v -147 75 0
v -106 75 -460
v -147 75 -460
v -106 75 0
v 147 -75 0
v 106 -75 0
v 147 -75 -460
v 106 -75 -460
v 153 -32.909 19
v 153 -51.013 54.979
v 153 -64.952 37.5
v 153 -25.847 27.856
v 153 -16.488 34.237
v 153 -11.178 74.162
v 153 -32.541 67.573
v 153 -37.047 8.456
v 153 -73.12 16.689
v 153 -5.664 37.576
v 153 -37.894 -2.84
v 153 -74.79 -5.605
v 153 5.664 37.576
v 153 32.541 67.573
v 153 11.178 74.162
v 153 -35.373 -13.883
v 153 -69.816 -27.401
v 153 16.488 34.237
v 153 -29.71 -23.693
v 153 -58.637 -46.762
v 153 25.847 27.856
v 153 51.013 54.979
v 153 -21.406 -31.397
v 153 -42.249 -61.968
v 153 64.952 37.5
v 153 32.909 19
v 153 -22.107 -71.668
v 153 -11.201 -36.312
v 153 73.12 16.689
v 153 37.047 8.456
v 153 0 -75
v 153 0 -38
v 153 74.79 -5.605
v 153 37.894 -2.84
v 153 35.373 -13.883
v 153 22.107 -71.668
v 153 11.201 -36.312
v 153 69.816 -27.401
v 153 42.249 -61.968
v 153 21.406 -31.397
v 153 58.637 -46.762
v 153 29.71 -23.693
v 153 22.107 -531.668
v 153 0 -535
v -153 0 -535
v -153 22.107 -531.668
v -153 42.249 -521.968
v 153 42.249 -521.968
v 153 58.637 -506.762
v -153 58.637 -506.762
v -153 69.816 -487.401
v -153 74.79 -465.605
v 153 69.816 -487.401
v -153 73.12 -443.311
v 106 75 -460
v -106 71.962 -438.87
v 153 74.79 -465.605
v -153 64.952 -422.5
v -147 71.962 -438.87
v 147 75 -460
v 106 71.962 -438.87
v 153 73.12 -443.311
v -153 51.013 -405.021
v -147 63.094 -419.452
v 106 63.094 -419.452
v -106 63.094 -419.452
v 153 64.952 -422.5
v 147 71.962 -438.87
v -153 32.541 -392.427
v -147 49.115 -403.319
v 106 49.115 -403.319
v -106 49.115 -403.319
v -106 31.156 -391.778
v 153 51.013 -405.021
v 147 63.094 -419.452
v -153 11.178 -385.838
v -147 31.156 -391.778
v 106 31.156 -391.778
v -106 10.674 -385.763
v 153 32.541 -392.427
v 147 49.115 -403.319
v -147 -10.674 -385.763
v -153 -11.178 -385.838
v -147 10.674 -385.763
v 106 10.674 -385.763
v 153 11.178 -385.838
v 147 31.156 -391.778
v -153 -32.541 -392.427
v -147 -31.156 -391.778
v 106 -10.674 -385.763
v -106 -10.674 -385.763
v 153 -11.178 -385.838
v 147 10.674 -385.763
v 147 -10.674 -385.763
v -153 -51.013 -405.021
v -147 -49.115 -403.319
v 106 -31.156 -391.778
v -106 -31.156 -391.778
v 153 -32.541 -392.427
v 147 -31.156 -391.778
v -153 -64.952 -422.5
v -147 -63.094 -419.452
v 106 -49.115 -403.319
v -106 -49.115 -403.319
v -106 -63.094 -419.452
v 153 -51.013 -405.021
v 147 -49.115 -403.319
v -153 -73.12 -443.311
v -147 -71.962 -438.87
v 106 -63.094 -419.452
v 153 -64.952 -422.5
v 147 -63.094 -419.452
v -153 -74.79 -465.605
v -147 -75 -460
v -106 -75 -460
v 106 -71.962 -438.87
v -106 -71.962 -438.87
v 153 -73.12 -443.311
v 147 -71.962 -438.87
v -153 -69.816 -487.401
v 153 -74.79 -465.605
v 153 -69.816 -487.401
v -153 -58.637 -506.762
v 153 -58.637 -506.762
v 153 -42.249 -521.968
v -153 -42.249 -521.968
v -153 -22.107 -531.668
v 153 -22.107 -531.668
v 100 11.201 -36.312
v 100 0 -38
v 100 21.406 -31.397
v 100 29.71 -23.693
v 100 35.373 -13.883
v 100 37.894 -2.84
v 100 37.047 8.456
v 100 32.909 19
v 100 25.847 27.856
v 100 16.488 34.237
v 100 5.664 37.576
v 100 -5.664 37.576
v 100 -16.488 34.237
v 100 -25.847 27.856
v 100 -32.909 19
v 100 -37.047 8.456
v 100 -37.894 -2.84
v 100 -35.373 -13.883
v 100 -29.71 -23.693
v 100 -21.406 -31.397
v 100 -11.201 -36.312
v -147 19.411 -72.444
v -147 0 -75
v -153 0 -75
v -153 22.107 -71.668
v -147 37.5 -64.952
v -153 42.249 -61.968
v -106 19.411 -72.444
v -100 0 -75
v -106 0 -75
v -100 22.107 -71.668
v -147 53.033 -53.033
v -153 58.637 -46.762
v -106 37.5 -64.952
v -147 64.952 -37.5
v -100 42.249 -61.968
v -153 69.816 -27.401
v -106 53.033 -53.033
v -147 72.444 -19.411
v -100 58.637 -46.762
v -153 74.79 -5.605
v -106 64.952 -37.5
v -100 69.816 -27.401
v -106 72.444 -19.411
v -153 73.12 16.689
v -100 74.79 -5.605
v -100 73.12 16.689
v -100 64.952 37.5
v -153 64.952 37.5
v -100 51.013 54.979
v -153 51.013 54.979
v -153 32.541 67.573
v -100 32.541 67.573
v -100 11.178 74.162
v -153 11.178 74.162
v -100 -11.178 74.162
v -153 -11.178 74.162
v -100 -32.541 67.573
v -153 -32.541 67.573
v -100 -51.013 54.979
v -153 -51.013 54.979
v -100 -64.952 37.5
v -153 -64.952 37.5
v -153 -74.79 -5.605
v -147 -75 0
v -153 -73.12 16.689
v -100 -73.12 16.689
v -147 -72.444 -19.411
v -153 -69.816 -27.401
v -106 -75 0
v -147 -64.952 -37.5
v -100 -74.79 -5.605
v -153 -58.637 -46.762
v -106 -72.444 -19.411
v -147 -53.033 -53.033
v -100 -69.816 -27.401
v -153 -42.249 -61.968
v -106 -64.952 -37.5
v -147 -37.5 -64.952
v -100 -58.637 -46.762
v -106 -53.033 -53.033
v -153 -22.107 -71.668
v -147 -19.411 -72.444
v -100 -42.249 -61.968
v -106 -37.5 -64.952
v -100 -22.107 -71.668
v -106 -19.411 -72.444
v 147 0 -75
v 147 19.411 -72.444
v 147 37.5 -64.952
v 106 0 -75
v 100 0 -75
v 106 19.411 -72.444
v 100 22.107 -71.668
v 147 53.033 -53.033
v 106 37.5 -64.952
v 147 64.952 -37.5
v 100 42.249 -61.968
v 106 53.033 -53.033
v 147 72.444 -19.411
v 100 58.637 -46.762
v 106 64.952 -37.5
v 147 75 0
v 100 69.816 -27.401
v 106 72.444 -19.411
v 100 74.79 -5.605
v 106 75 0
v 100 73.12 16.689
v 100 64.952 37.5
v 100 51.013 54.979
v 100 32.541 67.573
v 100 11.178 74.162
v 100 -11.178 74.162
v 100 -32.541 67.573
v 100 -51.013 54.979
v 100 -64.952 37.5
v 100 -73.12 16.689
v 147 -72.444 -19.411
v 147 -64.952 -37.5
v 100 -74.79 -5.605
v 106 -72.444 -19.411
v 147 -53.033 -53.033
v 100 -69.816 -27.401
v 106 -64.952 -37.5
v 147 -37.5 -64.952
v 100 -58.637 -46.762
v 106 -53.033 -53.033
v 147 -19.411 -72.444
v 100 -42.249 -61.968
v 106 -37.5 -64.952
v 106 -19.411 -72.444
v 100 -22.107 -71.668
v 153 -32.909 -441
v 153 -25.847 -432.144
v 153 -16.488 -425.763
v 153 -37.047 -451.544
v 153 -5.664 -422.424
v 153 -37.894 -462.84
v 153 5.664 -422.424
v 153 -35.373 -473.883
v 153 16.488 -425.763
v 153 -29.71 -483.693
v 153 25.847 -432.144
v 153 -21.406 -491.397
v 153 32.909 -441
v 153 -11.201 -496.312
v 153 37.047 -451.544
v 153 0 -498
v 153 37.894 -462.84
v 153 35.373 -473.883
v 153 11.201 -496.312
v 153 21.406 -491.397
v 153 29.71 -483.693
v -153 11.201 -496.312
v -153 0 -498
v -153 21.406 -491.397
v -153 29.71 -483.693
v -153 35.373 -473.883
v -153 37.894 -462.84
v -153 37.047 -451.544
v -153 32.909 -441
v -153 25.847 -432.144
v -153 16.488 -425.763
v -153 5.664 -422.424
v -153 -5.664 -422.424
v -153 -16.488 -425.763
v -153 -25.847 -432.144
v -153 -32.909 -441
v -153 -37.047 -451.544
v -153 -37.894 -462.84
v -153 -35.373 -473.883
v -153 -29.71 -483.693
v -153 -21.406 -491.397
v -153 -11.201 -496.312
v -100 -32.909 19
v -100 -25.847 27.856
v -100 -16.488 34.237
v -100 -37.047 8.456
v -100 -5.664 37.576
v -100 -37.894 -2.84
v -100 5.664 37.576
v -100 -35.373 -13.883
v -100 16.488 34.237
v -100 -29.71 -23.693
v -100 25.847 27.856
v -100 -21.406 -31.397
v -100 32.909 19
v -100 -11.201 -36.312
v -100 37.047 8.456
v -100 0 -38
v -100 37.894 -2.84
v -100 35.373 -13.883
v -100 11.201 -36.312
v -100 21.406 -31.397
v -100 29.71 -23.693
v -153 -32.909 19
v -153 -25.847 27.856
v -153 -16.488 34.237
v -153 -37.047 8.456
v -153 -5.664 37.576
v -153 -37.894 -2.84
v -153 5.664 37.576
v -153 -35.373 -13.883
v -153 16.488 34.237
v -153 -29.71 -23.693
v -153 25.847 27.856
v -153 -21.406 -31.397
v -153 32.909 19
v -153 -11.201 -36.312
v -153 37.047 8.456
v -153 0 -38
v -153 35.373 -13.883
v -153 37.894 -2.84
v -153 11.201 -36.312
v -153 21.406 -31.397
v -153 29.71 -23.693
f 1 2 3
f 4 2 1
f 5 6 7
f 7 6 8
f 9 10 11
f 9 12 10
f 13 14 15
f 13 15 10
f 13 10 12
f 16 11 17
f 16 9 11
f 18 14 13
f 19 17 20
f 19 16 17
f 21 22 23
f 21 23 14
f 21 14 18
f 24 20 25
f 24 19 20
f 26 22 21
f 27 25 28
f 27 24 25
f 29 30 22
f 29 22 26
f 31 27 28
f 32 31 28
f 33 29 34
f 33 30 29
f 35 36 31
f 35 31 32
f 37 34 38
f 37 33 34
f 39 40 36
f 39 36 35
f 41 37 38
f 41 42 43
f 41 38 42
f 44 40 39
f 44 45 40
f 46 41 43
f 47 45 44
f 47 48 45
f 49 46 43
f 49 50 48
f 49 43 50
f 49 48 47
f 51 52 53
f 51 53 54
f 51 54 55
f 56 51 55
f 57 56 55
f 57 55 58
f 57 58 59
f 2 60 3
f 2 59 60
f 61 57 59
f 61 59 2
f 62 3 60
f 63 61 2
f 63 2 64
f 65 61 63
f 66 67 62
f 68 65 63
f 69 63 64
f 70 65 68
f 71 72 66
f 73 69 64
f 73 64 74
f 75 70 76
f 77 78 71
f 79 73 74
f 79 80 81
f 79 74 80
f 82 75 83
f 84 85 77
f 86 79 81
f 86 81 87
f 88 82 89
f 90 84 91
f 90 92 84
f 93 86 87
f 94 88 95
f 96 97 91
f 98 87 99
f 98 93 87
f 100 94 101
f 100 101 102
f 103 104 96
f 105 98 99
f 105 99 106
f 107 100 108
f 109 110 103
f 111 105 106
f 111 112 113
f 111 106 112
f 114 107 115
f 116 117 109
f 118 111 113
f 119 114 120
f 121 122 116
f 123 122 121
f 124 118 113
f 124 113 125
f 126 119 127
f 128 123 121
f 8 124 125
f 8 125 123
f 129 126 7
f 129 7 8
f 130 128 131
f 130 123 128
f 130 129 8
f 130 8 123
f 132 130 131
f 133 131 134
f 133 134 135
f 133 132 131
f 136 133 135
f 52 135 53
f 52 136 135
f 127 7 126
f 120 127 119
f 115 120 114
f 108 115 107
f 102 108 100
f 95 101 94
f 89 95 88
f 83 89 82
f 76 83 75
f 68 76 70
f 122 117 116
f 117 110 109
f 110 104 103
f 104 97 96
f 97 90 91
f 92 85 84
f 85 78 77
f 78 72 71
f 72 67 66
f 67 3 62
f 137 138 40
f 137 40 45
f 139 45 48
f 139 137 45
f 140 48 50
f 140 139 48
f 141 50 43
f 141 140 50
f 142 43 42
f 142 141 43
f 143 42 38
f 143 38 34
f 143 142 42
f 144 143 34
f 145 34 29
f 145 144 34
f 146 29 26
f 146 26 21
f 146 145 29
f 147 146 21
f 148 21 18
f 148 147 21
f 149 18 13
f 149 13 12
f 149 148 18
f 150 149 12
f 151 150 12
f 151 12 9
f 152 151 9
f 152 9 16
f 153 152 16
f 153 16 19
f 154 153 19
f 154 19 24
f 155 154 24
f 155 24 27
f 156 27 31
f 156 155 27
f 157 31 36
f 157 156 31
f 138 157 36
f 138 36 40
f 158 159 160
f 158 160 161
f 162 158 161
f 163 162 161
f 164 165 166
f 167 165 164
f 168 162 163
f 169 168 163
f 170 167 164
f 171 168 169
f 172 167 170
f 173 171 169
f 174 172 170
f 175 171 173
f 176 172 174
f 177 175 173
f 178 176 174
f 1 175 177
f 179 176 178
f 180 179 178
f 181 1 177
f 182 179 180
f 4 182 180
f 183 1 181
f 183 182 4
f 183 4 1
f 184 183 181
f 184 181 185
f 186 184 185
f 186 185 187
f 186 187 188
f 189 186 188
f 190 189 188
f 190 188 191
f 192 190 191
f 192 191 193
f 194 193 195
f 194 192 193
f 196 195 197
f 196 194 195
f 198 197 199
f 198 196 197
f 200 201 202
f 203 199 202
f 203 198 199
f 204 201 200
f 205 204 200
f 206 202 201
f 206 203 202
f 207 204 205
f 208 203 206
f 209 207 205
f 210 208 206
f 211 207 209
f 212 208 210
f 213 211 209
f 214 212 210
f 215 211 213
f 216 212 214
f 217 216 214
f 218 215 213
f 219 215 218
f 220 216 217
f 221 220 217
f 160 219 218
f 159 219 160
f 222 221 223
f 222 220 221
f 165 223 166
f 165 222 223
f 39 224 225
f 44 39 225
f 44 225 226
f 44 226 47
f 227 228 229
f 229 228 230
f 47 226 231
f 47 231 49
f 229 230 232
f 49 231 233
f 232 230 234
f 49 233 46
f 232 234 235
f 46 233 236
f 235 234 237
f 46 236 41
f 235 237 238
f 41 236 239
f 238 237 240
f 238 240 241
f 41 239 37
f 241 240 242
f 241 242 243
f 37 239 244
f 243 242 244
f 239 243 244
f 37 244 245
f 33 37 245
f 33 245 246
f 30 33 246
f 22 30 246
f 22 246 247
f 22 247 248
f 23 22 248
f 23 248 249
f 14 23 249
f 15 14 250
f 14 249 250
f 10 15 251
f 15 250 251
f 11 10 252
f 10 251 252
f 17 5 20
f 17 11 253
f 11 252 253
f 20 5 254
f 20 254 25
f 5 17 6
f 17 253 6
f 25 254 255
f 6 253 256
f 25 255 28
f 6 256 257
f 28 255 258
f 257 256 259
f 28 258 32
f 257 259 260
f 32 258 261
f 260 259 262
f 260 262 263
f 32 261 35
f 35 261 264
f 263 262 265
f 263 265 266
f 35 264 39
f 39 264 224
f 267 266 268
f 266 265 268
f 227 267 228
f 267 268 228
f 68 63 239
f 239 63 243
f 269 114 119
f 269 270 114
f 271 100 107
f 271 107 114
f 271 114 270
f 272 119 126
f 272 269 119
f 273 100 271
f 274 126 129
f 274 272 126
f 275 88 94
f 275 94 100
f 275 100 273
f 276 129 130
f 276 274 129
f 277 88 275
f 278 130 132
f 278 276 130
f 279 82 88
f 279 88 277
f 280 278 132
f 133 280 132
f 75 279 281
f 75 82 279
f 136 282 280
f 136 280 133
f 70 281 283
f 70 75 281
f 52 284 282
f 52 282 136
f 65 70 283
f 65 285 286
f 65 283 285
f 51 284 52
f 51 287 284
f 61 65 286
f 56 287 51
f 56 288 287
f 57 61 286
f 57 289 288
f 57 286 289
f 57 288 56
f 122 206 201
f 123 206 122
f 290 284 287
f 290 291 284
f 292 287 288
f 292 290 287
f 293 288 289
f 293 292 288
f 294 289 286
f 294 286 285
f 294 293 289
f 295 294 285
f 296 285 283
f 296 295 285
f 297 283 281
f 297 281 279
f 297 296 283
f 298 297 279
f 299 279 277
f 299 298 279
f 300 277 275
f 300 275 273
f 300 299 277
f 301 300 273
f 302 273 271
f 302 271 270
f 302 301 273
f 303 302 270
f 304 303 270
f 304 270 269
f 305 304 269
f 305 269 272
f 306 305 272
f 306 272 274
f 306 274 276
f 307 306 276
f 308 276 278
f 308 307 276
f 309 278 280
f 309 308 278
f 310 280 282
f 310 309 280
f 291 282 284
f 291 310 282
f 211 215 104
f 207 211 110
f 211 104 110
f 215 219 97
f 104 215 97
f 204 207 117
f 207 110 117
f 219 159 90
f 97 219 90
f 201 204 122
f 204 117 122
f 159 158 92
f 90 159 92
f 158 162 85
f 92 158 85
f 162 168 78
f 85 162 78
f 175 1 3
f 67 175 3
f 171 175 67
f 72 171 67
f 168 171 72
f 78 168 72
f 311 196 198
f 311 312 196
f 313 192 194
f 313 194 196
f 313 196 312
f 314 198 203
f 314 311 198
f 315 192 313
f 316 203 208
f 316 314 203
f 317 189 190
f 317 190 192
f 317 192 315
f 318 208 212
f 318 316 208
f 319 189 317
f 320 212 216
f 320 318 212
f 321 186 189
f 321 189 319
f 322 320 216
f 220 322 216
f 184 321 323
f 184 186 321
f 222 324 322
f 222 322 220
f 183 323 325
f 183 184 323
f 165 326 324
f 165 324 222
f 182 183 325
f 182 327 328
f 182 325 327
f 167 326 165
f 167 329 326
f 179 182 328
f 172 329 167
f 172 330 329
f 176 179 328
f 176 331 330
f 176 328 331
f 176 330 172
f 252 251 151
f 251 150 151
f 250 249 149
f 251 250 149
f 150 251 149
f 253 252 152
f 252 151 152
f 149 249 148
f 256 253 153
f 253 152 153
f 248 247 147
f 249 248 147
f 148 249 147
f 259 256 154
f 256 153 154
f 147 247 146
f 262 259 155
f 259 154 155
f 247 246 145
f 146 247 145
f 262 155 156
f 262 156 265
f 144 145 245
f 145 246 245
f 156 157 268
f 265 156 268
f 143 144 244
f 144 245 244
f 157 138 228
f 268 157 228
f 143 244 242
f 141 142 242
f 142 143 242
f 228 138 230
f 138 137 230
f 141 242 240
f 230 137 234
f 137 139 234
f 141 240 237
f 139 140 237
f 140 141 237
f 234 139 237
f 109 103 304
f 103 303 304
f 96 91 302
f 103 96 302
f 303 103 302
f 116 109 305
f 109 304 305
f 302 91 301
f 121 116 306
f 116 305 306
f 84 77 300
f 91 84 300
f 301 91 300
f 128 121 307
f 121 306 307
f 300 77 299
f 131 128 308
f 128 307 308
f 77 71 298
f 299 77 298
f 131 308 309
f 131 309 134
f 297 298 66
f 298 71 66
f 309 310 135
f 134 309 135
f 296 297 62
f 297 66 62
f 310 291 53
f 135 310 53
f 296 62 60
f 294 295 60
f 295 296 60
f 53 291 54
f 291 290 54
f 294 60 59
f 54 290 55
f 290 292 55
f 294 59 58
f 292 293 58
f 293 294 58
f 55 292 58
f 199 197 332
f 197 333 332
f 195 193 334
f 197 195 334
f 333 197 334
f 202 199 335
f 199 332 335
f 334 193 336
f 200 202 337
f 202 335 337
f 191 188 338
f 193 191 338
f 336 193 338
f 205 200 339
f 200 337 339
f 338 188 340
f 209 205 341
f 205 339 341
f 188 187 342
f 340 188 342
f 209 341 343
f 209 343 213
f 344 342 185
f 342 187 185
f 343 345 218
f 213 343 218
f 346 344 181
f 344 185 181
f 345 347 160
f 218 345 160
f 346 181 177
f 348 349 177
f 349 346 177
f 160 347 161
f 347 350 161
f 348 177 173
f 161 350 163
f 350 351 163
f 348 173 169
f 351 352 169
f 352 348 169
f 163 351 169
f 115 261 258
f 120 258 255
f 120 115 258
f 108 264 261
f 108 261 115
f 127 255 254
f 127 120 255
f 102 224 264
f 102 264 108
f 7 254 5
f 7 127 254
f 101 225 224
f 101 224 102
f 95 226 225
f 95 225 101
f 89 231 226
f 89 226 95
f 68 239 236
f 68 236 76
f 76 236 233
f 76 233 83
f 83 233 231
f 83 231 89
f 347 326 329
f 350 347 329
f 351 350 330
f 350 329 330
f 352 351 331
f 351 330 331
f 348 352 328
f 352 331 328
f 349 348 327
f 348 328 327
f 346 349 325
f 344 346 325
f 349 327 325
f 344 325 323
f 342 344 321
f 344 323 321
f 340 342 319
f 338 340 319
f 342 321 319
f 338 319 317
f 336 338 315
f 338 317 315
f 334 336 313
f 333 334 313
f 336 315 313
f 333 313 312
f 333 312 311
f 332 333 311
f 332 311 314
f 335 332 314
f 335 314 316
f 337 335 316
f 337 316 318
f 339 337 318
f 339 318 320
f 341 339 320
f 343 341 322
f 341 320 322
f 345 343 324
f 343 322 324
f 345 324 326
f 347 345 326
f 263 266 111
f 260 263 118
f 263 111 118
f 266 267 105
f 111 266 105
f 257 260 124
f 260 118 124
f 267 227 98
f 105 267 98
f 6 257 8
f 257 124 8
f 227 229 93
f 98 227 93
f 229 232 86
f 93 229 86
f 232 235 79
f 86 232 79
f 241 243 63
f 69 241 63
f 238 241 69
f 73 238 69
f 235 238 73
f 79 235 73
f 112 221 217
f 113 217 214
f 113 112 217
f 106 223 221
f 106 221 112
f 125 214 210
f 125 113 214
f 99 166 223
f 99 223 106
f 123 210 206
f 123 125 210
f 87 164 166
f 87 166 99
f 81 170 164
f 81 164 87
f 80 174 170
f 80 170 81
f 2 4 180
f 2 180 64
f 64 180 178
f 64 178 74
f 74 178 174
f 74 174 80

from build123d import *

# Parameters (mm, degrees)
BOSS_EXTRUDE2_START   = 100
SKETCH2_R             = 75
SKETCH2_R_2           = 38
BOSS_EXTRUDE2_DEPTH   = 53
BOSS_EXTRUDE2_2_DEPTH = 53
BOSS_EXTRUDE3_START   = 106
BOSS_EXTRUDE3_DEPTH   = 41
SKETCH2_6_R           = 75
SKETCH2_6_R_2         = 38
BOSS_EXTRUDE4_DEPTH   = 100


with BuildPart() as part:
    # Sketch2 → Boss-Extrude2 (new body)
    with BuildSketch(Plane(origin=(0, 0, 0), x_dir=(0, 0, -1), z_dir=(1, 0, 0)).offset(BOSS_EXTRUDE2_START)):
        Circle(SKETCH2_R)
        Circle(SKETCH2_R_2, mode=Mode.SUBTRACT)
    boss_extrude2 = extrude(amount=BOSS_EXTRUDE2_DEPTH)



with BuildPart() as body_2:
    # Sketch2 → Boss-Extrude2 2 (new body)
    with BuildSketch(Plane(origin=(0, 0, 0), x_dir=(0, 0, -1), z_dir=(1, 0, 0)).offset(BOSS_EXTRUDE2_START)):
        with Locations((460, 0)):
            Circle(SKETCH2_R)
        with Locations((460, 0)):
            Circle(SKETCH2_R_2, mode=Mode.SUBTRACT)
    boss_extrude2_2 = extrude(amount=BOSS_EXTRUDE2_2_DEPTH)


with BuildPart() as part_1:
    add(part.part)

    add(body_2.part)  # Boss-Extrude3 merges body 2
    # Sketch2<5> → Boss-Extrude3 (add)
    with BuildSketch(Plane(origin=(0, 0, 0), x_dir=(0, 0, -1), z_dir=(1, 0, 0)).offset(BOSS_EXTRUDE3_START)):
        with BuildLine():
            ThreePointArc((0, 75), (53.033008589, 53.033008589), (75, 0))
            Line((75, 0), (385, 0))
            ThreePointArc((385, 0), (406.966991411, 53.033008589), (460, 75))
            Line((460, 75), (0, 75))
        make_face()
        with BuildLine():
            Line((385, 0), (75, 0))
            ThreePointArc((75, 0), (53.033008589, -53.033008589), (0, -75))
            Line((0, -75), (460, -75))
            ThreePointArc((460, -75), (406.966991411, -53.033008589), (385, 0))
        make_face()
    boss_extrude3 = extrude(amount=BOSS_EXTRUDE3_DEPTH)

    # Sketch2<6> → Boss-Extrude4 (add)
    with BuildSketch(Plane(origin=(0, 0, 0), x_dir=(0, 0, -1), z_dir=(1, 0, 0))):
        with Locations((460, 0)):
            Circle(SKETCH2_6_R)
        with Locations((460, 0)):
            Circle(SKETCH2_6_R_2, mode=Mode.SUBTRACT)
    boss_extrude4 = extrude(amount=BOSS_EXTRUDE4_DEPTH)

    # Mirror1: Boss-Extrude2, Boss-Extrude2 2, Boss-Extrude3, Boss-Extrude4 across plane
    add(boss_extrude2.mirror(Plane(origin=(0, 0, 0), x_dir=(0, 0, 1), z_dir=(1, 0, 0))))
    add(boss_extrude2_2.mirror(Plane(origin=(0, 0, 0), x_dir=(0, 0, 1), z_dir=(1, 0, 0))))
    add(boss_extrude3.mirror(Plane(origin=(0, 0, 0), x_dir=(0, 0, 1), z_dir=(1, 0, 0))))
    add(boss_extrude4.mirror(Plane(origin=(0, 0, 0), x_dir=(0, 0, 1), z_dir=(1, 0, 0))))


solid = part_1.part
